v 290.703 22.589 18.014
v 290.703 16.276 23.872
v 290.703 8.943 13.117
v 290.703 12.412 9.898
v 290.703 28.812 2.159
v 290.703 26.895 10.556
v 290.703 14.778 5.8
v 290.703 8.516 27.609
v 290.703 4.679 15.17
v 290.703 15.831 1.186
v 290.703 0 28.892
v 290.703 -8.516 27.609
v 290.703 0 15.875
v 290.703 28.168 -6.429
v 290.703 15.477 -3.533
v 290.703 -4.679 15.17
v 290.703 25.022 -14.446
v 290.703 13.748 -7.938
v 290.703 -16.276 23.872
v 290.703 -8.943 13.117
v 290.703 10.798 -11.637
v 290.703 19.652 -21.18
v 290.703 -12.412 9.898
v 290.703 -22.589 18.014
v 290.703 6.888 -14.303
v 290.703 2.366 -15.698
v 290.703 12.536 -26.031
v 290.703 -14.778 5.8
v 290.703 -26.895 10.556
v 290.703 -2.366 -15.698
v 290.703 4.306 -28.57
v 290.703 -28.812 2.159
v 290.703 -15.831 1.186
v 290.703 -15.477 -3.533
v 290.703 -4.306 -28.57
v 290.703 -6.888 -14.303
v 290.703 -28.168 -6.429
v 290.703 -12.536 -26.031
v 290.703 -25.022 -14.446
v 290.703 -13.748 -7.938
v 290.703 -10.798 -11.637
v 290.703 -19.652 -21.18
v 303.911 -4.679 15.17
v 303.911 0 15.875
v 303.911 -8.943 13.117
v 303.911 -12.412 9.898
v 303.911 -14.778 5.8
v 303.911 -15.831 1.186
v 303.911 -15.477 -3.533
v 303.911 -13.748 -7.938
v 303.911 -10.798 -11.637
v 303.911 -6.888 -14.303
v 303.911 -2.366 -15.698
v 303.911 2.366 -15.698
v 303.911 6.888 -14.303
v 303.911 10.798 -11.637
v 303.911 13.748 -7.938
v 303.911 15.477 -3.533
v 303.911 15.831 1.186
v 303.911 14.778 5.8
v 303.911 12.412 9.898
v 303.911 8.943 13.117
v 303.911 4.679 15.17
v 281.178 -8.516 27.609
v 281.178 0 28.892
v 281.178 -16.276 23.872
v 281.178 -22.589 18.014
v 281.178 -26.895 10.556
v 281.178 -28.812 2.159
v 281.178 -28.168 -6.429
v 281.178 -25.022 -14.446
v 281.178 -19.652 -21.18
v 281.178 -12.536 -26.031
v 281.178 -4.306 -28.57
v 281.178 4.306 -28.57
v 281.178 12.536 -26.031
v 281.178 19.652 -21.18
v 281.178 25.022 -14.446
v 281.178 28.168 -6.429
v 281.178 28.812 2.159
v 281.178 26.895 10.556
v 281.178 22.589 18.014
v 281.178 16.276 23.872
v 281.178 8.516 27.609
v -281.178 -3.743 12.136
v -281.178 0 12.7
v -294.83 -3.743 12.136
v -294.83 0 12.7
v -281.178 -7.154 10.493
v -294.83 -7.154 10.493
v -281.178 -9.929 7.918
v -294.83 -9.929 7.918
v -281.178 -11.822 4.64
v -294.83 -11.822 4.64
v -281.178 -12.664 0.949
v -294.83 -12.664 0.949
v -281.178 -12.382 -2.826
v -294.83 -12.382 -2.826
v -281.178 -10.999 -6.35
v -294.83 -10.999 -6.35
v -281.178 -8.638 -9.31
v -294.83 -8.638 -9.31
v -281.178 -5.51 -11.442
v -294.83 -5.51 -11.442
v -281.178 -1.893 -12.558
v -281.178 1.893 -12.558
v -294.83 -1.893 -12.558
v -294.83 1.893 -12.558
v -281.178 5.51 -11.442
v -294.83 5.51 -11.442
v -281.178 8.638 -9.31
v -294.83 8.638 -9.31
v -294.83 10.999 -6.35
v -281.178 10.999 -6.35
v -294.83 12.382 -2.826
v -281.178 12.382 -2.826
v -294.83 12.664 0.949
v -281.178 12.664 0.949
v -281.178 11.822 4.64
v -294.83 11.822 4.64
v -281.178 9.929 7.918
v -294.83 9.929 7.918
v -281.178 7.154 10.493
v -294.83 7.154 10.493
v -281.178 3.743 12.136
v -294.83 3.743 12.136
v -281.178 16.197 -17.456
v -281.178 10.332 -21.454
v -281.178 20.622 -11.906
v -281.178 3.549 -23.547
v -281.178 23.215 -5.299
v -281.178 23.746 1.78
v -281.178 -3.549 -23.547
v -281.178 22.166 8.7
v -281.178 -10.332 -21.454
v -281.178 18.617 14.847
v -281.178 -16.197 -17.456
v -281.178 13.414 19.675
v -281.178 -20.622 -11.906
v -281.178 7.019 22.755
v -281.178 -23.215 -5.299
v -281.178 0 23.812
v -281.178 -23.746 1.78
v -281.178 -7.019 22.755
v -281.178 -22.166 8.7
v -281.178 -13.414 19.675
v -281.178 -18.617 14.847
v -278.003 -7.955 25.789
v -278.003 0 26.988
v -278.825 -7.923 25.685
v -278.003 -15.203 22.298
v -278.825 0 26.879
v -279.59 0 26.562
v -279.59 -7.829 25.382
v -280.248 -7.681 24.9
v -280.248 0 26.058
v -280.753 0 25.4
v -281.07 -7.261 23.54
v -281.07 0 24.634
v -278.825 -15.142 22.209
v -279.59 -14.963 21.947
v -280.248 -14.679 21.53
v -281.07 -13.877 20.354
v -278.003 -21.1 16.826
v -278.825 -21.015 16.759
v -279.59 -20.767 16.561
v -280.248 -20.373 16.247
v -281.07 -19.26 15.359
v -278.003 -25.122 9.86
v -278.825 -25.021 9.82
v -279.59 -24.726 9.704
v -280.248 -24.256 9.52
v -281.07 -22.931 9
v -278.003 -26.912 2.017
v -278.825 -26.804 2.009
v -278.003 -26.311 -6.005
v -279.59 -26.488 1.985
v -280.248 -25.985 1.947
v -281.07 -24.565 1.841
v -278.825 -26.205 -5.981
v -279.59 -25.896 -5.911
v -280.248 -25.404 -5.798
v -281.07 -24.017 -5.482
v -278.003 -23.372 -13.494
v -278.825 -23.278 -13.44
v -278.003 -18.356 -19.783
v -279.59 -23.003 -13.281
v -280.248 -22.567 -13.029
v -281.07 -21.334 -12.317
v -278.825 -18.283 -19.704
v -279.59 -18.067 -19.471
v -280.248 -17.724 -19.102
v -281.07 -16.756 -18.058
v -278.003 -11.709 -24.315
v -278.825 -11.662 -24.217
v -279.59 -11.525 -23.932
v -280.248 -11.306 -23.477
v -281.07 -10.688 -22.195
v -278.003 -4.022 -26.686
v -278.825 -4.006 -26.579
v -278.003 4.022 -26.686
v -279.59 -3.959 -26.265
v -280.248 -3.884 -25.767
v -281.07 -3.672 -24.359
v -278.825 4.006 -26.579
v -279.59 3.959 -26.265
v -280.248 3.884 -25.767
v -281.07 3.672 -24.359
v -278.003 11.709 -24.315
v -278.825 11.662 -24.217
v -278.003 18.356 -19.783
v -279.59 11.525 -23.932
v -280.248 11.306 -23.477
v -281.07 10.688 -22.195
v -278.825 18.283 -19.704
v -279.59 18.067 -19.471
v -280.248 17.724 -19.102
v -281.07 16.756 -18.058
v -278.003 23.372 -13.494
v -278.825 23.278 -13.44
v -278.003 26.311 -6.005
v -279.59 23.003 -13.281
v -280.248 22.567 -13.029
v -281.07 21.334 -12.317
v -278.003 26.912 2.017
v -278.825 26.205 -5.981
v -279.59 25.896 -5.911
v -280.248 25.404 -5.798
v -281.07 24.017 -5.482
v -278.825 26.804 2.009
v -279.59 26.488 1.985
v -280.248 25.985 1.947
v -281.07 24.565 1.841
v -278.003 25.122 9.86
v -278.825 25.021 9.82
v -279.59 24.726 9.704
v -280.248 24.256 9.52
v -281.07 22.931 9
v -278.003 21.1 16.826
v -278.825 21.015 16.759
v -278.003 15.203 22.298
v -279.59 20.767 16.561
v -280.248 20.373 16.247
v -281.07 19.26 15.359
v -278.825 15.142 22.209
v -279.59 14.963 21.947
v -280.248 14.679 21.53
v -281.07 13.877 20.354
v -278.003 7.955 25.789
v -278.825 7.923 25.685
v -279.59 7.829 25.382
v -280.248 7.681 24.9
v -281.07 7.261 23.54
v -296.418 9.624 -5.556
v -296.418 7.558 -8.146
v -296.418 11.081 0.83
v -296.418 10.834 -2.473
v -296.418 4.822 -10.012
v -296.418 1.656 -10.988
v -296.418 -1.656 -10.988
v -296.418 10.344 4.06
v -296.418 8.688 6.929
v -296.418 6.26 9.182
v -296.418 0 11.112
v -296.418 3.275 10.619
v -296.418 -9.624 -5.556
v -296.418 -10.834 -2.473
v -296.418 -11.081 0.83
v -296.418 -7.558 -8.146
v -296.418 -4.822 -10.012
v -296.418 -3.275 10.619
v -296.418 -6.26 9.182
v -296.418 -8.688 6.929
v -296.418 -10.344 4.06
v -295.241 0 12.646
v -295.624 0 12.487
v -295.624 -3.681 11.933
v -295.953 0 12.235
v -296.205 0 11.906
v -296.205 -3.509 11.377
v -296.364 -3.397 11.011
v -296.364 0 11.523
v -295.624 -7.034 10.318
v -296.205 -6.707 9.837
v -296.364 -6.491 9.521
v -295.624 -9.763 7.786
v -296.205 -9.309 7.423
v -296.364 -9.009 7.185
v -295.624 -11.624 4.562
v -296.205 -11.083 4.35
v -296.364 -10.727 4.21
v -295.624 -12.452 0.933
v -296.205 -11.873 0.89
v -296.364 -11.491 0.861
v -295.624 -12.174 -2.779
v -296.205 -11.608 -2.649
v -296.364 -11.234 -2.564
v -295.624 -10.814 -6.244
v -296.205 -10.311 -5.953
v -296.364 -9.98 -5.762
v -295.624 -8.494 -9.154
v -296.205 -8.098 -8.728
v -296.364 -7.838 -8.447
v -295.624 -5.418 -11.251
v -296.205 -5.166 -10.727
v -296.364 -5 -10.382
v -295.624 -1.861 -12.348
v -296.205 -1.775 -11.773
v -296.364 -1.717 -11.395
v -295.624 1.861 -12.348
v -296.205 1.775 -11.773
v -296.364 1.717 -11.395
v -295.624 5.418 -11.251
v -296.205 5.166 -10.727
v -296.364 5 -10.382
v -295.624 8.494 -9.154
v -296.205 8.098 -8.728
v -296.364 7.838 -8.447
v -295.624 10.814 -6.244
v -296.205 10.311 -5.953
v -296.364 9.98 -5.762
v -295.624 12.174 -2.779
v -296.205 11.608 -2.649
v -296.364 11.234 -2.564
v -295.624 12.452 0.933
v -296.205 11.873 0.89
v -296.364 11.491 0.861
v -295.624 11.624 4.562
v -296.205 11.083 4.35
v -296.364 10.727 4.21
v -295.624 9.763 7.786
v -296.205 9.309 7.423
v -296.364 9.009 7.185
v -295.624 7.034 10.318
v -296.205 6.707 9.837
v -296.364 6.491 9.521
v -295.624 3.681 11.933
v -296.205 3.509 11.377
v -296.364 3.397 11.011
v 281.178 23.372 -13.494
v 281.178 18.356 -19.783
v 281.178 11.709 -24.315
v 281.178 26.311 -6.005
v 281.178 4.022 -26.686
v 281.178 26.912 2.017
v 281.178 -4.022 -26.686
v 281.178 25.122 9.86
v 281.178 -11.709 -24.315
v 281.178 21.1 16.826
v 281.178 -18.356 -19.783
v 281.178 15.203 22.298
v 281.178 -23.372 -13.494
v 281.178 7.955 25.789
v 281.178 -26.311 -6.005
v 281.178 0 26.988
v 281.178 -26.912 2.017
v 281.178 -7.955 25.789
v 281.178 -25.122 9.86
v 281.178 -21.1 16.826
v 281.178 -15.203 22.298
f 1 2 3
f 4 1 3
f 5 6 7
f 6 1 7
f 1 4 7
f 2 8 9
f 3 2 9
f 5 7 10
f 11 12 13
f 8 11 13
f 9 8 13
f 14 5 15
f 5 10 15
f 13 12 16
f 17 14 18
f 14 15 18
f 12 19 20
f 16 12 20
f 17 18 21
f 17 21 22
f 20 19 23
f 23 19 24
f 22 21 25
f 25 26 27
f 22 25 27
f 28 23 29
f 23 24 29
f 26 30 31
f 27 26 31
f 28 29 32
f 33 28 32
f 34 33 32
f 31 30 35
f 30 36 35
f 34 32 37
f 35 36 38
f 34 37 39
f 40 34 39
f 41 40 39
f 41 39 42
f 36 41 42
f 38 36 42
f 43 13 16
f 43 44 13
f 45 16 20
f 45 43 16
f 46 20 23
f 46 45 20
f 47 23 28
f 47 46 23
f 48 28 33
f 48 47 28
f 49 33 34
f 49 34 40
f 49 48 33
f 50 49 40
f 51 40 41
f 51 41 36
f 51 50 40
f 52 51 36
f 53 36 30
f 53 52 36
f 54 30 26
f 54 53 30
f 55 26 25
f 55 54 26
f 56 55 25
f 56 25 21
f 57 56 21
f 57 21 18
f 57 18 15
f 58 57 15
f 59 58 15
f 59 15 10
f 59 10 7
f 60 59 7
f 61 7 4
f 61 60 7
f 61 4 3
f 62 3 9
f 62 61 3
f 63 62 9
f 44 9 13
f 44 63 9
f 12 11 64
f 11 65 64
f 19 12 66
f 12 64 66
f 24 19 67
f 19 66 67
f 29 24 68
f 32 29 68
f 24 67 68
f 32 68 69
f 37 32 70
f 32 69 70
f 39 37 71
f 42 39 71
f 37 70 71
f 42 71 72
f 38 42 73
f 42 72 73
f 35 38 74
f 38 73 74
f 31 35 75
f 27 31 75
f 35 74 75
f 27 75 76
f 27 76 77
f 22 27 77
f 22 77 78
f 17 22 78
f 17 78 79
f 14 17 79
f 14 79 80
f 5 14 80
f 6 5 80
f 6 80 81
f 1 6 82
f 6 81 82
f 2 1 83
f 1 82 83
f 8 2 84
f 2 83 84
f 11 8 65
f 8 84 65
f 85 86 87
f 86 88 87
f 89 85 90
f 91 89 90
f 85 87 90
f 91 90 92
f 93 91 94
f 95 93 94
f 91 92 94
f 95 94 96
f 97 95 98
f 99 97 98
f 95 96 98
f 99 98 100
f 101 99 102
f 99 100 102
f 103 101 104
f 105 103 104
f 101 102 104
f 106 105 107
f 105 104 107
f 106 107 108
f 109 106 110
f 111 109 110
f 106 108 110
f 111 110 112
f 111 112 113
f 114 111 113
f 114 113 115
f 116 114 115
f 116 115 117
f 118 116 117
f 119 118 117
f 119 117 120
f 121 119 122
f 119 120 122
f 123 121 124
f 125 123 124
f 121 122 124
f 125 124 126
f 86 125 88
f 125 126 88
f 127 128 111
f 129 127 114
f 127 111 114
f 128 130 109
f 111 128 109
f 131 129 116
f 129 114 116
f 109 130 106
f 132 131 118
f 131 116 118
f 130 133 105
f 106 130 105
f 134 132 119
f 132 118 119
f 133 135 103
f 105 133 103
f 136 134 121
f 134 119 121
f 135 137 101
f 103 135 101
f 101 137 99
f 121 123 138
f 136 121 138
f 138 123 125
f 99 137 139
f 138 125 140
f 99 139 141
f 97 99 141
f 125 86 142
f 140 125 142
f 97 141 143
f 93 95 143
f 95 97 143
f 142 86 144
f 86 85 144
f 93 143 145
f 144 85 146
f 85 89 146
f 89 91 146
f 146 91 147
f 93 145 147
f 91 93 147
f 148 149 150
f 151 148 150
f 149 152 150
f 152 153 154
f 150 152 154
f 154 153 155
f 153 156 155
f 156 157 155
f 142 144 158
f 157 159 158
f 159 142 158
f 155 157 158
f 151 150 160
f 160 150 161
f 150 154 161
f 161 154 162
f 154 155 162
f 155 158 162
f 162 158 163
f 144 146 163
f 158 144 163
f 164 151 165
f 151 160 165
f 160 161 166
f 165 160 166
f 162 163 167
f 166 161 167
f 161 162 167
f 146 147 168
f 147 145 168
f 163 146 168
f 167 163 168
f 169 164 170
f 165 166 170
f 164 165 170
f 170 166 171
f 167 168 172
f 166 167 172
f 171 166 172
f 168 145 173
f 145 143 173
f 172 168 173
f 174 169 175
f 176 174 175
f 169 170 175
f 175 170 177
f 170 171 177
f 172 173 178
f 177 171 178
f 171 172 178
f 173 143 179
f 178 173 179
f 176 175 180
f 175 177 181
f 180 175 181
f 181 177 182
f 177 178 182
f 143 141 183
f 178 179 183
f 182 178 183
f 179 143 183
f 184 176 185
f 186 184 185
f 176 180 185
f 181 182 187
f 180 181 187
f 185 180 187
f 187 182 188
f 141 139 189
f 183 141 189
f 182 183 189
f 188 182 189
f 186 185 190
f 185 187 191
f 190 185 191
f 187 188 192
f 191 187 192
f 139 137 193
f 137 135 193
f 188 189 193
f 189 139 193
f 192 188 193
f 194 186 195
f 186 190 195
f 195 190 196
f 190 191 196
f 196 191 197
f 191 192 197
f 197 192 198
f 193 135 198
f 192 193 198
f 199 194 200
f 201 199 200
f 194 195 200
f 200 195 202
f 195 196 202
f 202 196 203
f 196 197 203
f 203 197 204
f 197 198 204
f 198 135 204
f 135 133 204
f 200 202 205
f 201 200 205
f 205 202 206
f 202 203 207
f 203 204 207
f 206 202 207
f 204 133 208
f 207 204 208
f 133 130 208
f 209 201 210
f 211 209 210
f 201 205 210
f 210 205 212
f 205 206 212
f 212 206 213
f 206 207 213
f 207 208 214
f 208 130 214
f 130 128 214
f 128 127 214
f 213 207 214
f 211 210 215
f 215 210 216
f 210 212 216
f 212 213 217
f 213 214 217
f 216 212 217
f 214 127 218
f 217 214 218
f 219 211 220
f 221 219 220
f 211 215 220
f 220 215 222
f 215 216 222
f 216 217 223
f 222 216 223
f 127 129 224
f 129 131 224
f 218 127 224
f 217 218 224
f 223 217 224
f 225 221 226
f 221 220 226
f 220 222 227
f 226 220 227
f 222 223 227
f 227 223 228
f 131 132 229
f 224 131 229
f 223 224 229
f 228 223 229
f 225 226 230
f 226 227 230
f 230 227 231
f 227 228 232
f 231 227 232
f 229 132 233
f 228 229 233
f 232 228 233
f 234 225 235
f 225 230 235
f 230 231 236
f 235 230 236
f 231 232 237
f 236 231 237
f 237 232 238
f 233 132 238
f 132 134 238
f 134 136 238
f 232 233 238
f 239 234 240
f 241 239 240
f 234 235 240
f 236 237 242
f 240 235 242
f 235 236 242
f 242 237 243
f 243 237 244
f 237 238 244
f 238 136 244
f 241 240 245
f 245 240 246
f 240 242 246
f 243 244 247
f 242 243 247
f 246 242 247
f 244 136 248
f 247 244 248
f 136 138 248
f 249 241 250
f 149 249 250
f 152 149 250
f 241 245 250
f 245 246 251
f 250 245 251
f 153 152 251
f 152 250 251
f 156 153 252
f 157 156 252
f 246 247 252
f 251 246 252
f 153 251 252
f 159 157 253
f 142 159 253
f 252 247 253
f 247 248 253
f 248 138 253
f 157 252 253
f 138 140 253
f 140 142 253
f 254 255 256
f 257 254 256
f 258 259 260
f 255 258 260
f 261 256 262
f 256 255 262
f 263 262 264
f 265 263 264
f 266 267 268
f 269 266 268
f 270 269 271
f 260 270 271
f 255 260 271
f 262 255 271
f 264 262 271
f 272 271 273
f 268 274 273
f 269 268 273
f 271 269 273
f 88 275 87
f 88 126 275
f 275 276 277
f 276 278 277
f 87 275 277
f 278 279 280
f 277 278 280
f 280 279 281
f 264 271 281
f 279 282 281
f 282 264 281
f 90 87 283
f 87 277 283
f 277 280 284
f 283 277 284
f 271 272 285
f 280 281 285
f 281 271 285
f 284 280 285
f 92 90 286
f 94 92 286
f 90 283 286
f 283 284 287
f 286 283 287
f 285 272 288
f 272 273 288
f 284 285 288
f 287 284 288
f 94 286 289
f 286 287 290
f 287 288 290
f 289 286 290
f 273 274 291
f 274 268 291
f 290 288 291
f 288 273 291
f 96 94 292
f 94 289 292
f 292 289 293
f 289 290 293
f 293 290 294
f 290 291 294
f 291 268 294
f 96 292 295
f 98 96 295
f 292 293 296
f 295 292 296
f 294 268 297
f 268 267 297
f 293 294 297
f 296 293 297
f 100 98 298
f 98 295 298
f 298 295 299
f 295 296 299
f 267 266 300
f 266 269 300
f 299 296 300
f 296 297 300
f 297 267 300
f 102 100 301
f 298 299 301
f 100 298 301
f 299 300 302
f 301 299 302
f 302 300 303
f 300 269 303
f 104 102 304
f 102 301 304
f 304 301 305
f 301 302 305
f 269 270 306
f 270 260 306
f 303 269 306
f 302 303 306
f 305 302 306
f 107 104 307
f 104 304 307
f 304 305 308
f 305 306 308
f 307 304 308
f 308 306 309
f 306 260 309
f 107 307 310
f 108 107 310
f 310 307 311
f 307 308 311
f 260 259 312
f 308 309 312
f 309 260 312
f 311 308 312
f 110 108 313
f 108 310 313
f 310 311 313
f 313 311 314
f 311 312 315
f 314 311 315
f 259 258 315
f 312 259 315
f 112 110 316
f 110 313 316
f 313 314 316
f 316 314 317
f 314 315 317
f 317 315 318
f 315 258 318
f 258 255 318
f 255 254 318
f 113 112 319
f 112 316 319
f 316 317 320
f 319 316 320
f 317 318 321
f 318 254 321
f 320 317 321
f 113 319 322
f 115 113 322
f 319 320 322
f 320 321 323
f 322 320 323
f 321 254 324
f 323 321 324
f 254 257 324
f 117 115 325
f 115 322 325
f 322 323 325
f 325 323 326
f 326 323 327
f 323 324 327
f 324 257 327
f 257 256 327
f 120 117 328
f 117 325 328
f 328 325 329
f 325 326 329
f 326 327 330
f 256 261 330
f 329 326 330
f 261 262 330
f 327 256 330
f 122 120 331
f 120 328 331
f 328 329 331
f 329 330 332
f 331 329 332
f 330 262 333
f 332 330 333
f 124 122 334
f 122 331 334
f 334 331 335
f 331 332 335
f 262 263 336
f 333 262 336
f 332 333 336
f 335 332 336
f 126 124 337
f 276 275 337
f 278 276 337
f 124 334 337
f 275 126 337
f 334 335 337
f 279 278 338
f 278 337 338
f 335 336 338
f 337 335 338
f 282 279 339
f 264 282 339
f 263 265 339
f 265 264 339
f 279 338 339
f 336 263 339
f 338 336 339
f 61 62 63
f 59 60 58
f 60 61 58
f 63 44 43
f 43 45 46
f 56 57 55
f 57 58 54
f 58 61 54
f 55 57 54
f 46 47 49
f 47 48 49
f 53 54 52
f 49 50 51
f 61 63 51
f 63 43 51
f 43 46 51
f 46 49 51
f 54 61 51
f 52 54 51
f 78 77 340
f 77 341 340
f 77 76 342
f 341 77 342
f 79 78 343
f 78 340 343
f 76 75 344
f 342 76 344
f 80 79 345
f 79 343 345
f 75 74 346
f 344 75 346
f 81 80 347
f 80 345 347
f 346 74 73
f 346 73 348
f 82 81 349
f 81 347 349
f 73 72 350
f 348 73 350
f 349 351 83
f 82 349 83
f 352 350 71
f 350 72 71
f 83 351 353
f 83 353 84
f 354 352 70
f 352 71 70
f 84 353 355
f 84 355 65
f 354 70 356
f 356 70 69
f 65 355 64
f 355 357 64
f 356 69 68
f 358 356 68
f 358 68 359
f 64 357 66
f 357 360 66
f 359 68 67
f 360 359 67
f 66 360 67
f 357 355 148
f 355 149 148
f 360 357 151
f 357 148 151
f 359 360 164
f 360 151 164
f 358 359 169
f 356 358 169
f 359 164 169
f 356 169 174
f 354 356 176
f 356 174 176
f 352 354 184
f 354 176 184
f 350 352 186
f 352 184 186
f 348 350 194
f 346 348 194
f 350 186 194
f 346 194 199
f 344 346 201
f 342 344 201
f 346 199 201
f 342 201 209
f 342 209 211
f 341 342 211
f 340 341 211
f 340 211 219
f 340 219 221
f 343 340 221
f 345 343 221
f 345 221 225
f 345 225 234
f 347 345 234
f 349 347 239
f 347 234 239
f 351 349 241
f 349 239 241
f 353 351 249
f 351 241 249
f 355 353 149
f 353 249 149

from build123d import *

# Parameters (mm, degrees)
SKETCH1_W = 13.208
SKETCH1_H = 15.875


with BuildPart() as part:
    # Sketch1 → Revolve1 (revolve)
    with BuildSketch(Plane(origin=(0, 0, 0), x_dir=(1, 0, 0), z_dir=(0, 1, 0)), mode=Mode.PRIVATE) as revolve1_sk:
        with BuildLine():
            Line((-281.178, 12.7), (-281.178, 0))
            Line((-281.178, 0), (281.178, 0))
            Line((281.178, 0), (281.178, 26.9875))
            Line((281.178, 26.9875), (-278.003, 26.9875))
            ThreePointArc((-278.003, 26.9875), (-280.24806403, 26.05756403), (-281.178, 23.8125))
            Line((-281.178, 23.8125), (-281.178, 12.7))
        make_face()
        with BuildLine():
            Line((-296.418, 11.1125), (-296.418, 0))
            Line((-296.418, 0), (-281.178, 0))
            Line((-281.178, 0), (-281.178, 12.7))
            Line((-281.178, 12.7), (-294.8305, 12.7))
            ThreePointArc((-294.8305, 12.7), (-295.953032015, 12.235032015), (-296.418, 11.1125))
        make_face()
        Polygon((281.178, 26.9875), (281.178, 0), (290.703, 0), (290.703, 15.875), (290.703, 28.8925), (281.178, 28.8925), align=None)
        with Locations((297.307, 7.9375)):
            Rectangle(SKETCH1_W, SKETCH1_H)
    revolve(revolve1_sk.sketch.rotate(Axis((-319.562207996, 0, 0), (1, 0, 0)), 180), axis=Axis((-319.562207996, 0, 0), (1, 0, 0)))


solid = part.part
